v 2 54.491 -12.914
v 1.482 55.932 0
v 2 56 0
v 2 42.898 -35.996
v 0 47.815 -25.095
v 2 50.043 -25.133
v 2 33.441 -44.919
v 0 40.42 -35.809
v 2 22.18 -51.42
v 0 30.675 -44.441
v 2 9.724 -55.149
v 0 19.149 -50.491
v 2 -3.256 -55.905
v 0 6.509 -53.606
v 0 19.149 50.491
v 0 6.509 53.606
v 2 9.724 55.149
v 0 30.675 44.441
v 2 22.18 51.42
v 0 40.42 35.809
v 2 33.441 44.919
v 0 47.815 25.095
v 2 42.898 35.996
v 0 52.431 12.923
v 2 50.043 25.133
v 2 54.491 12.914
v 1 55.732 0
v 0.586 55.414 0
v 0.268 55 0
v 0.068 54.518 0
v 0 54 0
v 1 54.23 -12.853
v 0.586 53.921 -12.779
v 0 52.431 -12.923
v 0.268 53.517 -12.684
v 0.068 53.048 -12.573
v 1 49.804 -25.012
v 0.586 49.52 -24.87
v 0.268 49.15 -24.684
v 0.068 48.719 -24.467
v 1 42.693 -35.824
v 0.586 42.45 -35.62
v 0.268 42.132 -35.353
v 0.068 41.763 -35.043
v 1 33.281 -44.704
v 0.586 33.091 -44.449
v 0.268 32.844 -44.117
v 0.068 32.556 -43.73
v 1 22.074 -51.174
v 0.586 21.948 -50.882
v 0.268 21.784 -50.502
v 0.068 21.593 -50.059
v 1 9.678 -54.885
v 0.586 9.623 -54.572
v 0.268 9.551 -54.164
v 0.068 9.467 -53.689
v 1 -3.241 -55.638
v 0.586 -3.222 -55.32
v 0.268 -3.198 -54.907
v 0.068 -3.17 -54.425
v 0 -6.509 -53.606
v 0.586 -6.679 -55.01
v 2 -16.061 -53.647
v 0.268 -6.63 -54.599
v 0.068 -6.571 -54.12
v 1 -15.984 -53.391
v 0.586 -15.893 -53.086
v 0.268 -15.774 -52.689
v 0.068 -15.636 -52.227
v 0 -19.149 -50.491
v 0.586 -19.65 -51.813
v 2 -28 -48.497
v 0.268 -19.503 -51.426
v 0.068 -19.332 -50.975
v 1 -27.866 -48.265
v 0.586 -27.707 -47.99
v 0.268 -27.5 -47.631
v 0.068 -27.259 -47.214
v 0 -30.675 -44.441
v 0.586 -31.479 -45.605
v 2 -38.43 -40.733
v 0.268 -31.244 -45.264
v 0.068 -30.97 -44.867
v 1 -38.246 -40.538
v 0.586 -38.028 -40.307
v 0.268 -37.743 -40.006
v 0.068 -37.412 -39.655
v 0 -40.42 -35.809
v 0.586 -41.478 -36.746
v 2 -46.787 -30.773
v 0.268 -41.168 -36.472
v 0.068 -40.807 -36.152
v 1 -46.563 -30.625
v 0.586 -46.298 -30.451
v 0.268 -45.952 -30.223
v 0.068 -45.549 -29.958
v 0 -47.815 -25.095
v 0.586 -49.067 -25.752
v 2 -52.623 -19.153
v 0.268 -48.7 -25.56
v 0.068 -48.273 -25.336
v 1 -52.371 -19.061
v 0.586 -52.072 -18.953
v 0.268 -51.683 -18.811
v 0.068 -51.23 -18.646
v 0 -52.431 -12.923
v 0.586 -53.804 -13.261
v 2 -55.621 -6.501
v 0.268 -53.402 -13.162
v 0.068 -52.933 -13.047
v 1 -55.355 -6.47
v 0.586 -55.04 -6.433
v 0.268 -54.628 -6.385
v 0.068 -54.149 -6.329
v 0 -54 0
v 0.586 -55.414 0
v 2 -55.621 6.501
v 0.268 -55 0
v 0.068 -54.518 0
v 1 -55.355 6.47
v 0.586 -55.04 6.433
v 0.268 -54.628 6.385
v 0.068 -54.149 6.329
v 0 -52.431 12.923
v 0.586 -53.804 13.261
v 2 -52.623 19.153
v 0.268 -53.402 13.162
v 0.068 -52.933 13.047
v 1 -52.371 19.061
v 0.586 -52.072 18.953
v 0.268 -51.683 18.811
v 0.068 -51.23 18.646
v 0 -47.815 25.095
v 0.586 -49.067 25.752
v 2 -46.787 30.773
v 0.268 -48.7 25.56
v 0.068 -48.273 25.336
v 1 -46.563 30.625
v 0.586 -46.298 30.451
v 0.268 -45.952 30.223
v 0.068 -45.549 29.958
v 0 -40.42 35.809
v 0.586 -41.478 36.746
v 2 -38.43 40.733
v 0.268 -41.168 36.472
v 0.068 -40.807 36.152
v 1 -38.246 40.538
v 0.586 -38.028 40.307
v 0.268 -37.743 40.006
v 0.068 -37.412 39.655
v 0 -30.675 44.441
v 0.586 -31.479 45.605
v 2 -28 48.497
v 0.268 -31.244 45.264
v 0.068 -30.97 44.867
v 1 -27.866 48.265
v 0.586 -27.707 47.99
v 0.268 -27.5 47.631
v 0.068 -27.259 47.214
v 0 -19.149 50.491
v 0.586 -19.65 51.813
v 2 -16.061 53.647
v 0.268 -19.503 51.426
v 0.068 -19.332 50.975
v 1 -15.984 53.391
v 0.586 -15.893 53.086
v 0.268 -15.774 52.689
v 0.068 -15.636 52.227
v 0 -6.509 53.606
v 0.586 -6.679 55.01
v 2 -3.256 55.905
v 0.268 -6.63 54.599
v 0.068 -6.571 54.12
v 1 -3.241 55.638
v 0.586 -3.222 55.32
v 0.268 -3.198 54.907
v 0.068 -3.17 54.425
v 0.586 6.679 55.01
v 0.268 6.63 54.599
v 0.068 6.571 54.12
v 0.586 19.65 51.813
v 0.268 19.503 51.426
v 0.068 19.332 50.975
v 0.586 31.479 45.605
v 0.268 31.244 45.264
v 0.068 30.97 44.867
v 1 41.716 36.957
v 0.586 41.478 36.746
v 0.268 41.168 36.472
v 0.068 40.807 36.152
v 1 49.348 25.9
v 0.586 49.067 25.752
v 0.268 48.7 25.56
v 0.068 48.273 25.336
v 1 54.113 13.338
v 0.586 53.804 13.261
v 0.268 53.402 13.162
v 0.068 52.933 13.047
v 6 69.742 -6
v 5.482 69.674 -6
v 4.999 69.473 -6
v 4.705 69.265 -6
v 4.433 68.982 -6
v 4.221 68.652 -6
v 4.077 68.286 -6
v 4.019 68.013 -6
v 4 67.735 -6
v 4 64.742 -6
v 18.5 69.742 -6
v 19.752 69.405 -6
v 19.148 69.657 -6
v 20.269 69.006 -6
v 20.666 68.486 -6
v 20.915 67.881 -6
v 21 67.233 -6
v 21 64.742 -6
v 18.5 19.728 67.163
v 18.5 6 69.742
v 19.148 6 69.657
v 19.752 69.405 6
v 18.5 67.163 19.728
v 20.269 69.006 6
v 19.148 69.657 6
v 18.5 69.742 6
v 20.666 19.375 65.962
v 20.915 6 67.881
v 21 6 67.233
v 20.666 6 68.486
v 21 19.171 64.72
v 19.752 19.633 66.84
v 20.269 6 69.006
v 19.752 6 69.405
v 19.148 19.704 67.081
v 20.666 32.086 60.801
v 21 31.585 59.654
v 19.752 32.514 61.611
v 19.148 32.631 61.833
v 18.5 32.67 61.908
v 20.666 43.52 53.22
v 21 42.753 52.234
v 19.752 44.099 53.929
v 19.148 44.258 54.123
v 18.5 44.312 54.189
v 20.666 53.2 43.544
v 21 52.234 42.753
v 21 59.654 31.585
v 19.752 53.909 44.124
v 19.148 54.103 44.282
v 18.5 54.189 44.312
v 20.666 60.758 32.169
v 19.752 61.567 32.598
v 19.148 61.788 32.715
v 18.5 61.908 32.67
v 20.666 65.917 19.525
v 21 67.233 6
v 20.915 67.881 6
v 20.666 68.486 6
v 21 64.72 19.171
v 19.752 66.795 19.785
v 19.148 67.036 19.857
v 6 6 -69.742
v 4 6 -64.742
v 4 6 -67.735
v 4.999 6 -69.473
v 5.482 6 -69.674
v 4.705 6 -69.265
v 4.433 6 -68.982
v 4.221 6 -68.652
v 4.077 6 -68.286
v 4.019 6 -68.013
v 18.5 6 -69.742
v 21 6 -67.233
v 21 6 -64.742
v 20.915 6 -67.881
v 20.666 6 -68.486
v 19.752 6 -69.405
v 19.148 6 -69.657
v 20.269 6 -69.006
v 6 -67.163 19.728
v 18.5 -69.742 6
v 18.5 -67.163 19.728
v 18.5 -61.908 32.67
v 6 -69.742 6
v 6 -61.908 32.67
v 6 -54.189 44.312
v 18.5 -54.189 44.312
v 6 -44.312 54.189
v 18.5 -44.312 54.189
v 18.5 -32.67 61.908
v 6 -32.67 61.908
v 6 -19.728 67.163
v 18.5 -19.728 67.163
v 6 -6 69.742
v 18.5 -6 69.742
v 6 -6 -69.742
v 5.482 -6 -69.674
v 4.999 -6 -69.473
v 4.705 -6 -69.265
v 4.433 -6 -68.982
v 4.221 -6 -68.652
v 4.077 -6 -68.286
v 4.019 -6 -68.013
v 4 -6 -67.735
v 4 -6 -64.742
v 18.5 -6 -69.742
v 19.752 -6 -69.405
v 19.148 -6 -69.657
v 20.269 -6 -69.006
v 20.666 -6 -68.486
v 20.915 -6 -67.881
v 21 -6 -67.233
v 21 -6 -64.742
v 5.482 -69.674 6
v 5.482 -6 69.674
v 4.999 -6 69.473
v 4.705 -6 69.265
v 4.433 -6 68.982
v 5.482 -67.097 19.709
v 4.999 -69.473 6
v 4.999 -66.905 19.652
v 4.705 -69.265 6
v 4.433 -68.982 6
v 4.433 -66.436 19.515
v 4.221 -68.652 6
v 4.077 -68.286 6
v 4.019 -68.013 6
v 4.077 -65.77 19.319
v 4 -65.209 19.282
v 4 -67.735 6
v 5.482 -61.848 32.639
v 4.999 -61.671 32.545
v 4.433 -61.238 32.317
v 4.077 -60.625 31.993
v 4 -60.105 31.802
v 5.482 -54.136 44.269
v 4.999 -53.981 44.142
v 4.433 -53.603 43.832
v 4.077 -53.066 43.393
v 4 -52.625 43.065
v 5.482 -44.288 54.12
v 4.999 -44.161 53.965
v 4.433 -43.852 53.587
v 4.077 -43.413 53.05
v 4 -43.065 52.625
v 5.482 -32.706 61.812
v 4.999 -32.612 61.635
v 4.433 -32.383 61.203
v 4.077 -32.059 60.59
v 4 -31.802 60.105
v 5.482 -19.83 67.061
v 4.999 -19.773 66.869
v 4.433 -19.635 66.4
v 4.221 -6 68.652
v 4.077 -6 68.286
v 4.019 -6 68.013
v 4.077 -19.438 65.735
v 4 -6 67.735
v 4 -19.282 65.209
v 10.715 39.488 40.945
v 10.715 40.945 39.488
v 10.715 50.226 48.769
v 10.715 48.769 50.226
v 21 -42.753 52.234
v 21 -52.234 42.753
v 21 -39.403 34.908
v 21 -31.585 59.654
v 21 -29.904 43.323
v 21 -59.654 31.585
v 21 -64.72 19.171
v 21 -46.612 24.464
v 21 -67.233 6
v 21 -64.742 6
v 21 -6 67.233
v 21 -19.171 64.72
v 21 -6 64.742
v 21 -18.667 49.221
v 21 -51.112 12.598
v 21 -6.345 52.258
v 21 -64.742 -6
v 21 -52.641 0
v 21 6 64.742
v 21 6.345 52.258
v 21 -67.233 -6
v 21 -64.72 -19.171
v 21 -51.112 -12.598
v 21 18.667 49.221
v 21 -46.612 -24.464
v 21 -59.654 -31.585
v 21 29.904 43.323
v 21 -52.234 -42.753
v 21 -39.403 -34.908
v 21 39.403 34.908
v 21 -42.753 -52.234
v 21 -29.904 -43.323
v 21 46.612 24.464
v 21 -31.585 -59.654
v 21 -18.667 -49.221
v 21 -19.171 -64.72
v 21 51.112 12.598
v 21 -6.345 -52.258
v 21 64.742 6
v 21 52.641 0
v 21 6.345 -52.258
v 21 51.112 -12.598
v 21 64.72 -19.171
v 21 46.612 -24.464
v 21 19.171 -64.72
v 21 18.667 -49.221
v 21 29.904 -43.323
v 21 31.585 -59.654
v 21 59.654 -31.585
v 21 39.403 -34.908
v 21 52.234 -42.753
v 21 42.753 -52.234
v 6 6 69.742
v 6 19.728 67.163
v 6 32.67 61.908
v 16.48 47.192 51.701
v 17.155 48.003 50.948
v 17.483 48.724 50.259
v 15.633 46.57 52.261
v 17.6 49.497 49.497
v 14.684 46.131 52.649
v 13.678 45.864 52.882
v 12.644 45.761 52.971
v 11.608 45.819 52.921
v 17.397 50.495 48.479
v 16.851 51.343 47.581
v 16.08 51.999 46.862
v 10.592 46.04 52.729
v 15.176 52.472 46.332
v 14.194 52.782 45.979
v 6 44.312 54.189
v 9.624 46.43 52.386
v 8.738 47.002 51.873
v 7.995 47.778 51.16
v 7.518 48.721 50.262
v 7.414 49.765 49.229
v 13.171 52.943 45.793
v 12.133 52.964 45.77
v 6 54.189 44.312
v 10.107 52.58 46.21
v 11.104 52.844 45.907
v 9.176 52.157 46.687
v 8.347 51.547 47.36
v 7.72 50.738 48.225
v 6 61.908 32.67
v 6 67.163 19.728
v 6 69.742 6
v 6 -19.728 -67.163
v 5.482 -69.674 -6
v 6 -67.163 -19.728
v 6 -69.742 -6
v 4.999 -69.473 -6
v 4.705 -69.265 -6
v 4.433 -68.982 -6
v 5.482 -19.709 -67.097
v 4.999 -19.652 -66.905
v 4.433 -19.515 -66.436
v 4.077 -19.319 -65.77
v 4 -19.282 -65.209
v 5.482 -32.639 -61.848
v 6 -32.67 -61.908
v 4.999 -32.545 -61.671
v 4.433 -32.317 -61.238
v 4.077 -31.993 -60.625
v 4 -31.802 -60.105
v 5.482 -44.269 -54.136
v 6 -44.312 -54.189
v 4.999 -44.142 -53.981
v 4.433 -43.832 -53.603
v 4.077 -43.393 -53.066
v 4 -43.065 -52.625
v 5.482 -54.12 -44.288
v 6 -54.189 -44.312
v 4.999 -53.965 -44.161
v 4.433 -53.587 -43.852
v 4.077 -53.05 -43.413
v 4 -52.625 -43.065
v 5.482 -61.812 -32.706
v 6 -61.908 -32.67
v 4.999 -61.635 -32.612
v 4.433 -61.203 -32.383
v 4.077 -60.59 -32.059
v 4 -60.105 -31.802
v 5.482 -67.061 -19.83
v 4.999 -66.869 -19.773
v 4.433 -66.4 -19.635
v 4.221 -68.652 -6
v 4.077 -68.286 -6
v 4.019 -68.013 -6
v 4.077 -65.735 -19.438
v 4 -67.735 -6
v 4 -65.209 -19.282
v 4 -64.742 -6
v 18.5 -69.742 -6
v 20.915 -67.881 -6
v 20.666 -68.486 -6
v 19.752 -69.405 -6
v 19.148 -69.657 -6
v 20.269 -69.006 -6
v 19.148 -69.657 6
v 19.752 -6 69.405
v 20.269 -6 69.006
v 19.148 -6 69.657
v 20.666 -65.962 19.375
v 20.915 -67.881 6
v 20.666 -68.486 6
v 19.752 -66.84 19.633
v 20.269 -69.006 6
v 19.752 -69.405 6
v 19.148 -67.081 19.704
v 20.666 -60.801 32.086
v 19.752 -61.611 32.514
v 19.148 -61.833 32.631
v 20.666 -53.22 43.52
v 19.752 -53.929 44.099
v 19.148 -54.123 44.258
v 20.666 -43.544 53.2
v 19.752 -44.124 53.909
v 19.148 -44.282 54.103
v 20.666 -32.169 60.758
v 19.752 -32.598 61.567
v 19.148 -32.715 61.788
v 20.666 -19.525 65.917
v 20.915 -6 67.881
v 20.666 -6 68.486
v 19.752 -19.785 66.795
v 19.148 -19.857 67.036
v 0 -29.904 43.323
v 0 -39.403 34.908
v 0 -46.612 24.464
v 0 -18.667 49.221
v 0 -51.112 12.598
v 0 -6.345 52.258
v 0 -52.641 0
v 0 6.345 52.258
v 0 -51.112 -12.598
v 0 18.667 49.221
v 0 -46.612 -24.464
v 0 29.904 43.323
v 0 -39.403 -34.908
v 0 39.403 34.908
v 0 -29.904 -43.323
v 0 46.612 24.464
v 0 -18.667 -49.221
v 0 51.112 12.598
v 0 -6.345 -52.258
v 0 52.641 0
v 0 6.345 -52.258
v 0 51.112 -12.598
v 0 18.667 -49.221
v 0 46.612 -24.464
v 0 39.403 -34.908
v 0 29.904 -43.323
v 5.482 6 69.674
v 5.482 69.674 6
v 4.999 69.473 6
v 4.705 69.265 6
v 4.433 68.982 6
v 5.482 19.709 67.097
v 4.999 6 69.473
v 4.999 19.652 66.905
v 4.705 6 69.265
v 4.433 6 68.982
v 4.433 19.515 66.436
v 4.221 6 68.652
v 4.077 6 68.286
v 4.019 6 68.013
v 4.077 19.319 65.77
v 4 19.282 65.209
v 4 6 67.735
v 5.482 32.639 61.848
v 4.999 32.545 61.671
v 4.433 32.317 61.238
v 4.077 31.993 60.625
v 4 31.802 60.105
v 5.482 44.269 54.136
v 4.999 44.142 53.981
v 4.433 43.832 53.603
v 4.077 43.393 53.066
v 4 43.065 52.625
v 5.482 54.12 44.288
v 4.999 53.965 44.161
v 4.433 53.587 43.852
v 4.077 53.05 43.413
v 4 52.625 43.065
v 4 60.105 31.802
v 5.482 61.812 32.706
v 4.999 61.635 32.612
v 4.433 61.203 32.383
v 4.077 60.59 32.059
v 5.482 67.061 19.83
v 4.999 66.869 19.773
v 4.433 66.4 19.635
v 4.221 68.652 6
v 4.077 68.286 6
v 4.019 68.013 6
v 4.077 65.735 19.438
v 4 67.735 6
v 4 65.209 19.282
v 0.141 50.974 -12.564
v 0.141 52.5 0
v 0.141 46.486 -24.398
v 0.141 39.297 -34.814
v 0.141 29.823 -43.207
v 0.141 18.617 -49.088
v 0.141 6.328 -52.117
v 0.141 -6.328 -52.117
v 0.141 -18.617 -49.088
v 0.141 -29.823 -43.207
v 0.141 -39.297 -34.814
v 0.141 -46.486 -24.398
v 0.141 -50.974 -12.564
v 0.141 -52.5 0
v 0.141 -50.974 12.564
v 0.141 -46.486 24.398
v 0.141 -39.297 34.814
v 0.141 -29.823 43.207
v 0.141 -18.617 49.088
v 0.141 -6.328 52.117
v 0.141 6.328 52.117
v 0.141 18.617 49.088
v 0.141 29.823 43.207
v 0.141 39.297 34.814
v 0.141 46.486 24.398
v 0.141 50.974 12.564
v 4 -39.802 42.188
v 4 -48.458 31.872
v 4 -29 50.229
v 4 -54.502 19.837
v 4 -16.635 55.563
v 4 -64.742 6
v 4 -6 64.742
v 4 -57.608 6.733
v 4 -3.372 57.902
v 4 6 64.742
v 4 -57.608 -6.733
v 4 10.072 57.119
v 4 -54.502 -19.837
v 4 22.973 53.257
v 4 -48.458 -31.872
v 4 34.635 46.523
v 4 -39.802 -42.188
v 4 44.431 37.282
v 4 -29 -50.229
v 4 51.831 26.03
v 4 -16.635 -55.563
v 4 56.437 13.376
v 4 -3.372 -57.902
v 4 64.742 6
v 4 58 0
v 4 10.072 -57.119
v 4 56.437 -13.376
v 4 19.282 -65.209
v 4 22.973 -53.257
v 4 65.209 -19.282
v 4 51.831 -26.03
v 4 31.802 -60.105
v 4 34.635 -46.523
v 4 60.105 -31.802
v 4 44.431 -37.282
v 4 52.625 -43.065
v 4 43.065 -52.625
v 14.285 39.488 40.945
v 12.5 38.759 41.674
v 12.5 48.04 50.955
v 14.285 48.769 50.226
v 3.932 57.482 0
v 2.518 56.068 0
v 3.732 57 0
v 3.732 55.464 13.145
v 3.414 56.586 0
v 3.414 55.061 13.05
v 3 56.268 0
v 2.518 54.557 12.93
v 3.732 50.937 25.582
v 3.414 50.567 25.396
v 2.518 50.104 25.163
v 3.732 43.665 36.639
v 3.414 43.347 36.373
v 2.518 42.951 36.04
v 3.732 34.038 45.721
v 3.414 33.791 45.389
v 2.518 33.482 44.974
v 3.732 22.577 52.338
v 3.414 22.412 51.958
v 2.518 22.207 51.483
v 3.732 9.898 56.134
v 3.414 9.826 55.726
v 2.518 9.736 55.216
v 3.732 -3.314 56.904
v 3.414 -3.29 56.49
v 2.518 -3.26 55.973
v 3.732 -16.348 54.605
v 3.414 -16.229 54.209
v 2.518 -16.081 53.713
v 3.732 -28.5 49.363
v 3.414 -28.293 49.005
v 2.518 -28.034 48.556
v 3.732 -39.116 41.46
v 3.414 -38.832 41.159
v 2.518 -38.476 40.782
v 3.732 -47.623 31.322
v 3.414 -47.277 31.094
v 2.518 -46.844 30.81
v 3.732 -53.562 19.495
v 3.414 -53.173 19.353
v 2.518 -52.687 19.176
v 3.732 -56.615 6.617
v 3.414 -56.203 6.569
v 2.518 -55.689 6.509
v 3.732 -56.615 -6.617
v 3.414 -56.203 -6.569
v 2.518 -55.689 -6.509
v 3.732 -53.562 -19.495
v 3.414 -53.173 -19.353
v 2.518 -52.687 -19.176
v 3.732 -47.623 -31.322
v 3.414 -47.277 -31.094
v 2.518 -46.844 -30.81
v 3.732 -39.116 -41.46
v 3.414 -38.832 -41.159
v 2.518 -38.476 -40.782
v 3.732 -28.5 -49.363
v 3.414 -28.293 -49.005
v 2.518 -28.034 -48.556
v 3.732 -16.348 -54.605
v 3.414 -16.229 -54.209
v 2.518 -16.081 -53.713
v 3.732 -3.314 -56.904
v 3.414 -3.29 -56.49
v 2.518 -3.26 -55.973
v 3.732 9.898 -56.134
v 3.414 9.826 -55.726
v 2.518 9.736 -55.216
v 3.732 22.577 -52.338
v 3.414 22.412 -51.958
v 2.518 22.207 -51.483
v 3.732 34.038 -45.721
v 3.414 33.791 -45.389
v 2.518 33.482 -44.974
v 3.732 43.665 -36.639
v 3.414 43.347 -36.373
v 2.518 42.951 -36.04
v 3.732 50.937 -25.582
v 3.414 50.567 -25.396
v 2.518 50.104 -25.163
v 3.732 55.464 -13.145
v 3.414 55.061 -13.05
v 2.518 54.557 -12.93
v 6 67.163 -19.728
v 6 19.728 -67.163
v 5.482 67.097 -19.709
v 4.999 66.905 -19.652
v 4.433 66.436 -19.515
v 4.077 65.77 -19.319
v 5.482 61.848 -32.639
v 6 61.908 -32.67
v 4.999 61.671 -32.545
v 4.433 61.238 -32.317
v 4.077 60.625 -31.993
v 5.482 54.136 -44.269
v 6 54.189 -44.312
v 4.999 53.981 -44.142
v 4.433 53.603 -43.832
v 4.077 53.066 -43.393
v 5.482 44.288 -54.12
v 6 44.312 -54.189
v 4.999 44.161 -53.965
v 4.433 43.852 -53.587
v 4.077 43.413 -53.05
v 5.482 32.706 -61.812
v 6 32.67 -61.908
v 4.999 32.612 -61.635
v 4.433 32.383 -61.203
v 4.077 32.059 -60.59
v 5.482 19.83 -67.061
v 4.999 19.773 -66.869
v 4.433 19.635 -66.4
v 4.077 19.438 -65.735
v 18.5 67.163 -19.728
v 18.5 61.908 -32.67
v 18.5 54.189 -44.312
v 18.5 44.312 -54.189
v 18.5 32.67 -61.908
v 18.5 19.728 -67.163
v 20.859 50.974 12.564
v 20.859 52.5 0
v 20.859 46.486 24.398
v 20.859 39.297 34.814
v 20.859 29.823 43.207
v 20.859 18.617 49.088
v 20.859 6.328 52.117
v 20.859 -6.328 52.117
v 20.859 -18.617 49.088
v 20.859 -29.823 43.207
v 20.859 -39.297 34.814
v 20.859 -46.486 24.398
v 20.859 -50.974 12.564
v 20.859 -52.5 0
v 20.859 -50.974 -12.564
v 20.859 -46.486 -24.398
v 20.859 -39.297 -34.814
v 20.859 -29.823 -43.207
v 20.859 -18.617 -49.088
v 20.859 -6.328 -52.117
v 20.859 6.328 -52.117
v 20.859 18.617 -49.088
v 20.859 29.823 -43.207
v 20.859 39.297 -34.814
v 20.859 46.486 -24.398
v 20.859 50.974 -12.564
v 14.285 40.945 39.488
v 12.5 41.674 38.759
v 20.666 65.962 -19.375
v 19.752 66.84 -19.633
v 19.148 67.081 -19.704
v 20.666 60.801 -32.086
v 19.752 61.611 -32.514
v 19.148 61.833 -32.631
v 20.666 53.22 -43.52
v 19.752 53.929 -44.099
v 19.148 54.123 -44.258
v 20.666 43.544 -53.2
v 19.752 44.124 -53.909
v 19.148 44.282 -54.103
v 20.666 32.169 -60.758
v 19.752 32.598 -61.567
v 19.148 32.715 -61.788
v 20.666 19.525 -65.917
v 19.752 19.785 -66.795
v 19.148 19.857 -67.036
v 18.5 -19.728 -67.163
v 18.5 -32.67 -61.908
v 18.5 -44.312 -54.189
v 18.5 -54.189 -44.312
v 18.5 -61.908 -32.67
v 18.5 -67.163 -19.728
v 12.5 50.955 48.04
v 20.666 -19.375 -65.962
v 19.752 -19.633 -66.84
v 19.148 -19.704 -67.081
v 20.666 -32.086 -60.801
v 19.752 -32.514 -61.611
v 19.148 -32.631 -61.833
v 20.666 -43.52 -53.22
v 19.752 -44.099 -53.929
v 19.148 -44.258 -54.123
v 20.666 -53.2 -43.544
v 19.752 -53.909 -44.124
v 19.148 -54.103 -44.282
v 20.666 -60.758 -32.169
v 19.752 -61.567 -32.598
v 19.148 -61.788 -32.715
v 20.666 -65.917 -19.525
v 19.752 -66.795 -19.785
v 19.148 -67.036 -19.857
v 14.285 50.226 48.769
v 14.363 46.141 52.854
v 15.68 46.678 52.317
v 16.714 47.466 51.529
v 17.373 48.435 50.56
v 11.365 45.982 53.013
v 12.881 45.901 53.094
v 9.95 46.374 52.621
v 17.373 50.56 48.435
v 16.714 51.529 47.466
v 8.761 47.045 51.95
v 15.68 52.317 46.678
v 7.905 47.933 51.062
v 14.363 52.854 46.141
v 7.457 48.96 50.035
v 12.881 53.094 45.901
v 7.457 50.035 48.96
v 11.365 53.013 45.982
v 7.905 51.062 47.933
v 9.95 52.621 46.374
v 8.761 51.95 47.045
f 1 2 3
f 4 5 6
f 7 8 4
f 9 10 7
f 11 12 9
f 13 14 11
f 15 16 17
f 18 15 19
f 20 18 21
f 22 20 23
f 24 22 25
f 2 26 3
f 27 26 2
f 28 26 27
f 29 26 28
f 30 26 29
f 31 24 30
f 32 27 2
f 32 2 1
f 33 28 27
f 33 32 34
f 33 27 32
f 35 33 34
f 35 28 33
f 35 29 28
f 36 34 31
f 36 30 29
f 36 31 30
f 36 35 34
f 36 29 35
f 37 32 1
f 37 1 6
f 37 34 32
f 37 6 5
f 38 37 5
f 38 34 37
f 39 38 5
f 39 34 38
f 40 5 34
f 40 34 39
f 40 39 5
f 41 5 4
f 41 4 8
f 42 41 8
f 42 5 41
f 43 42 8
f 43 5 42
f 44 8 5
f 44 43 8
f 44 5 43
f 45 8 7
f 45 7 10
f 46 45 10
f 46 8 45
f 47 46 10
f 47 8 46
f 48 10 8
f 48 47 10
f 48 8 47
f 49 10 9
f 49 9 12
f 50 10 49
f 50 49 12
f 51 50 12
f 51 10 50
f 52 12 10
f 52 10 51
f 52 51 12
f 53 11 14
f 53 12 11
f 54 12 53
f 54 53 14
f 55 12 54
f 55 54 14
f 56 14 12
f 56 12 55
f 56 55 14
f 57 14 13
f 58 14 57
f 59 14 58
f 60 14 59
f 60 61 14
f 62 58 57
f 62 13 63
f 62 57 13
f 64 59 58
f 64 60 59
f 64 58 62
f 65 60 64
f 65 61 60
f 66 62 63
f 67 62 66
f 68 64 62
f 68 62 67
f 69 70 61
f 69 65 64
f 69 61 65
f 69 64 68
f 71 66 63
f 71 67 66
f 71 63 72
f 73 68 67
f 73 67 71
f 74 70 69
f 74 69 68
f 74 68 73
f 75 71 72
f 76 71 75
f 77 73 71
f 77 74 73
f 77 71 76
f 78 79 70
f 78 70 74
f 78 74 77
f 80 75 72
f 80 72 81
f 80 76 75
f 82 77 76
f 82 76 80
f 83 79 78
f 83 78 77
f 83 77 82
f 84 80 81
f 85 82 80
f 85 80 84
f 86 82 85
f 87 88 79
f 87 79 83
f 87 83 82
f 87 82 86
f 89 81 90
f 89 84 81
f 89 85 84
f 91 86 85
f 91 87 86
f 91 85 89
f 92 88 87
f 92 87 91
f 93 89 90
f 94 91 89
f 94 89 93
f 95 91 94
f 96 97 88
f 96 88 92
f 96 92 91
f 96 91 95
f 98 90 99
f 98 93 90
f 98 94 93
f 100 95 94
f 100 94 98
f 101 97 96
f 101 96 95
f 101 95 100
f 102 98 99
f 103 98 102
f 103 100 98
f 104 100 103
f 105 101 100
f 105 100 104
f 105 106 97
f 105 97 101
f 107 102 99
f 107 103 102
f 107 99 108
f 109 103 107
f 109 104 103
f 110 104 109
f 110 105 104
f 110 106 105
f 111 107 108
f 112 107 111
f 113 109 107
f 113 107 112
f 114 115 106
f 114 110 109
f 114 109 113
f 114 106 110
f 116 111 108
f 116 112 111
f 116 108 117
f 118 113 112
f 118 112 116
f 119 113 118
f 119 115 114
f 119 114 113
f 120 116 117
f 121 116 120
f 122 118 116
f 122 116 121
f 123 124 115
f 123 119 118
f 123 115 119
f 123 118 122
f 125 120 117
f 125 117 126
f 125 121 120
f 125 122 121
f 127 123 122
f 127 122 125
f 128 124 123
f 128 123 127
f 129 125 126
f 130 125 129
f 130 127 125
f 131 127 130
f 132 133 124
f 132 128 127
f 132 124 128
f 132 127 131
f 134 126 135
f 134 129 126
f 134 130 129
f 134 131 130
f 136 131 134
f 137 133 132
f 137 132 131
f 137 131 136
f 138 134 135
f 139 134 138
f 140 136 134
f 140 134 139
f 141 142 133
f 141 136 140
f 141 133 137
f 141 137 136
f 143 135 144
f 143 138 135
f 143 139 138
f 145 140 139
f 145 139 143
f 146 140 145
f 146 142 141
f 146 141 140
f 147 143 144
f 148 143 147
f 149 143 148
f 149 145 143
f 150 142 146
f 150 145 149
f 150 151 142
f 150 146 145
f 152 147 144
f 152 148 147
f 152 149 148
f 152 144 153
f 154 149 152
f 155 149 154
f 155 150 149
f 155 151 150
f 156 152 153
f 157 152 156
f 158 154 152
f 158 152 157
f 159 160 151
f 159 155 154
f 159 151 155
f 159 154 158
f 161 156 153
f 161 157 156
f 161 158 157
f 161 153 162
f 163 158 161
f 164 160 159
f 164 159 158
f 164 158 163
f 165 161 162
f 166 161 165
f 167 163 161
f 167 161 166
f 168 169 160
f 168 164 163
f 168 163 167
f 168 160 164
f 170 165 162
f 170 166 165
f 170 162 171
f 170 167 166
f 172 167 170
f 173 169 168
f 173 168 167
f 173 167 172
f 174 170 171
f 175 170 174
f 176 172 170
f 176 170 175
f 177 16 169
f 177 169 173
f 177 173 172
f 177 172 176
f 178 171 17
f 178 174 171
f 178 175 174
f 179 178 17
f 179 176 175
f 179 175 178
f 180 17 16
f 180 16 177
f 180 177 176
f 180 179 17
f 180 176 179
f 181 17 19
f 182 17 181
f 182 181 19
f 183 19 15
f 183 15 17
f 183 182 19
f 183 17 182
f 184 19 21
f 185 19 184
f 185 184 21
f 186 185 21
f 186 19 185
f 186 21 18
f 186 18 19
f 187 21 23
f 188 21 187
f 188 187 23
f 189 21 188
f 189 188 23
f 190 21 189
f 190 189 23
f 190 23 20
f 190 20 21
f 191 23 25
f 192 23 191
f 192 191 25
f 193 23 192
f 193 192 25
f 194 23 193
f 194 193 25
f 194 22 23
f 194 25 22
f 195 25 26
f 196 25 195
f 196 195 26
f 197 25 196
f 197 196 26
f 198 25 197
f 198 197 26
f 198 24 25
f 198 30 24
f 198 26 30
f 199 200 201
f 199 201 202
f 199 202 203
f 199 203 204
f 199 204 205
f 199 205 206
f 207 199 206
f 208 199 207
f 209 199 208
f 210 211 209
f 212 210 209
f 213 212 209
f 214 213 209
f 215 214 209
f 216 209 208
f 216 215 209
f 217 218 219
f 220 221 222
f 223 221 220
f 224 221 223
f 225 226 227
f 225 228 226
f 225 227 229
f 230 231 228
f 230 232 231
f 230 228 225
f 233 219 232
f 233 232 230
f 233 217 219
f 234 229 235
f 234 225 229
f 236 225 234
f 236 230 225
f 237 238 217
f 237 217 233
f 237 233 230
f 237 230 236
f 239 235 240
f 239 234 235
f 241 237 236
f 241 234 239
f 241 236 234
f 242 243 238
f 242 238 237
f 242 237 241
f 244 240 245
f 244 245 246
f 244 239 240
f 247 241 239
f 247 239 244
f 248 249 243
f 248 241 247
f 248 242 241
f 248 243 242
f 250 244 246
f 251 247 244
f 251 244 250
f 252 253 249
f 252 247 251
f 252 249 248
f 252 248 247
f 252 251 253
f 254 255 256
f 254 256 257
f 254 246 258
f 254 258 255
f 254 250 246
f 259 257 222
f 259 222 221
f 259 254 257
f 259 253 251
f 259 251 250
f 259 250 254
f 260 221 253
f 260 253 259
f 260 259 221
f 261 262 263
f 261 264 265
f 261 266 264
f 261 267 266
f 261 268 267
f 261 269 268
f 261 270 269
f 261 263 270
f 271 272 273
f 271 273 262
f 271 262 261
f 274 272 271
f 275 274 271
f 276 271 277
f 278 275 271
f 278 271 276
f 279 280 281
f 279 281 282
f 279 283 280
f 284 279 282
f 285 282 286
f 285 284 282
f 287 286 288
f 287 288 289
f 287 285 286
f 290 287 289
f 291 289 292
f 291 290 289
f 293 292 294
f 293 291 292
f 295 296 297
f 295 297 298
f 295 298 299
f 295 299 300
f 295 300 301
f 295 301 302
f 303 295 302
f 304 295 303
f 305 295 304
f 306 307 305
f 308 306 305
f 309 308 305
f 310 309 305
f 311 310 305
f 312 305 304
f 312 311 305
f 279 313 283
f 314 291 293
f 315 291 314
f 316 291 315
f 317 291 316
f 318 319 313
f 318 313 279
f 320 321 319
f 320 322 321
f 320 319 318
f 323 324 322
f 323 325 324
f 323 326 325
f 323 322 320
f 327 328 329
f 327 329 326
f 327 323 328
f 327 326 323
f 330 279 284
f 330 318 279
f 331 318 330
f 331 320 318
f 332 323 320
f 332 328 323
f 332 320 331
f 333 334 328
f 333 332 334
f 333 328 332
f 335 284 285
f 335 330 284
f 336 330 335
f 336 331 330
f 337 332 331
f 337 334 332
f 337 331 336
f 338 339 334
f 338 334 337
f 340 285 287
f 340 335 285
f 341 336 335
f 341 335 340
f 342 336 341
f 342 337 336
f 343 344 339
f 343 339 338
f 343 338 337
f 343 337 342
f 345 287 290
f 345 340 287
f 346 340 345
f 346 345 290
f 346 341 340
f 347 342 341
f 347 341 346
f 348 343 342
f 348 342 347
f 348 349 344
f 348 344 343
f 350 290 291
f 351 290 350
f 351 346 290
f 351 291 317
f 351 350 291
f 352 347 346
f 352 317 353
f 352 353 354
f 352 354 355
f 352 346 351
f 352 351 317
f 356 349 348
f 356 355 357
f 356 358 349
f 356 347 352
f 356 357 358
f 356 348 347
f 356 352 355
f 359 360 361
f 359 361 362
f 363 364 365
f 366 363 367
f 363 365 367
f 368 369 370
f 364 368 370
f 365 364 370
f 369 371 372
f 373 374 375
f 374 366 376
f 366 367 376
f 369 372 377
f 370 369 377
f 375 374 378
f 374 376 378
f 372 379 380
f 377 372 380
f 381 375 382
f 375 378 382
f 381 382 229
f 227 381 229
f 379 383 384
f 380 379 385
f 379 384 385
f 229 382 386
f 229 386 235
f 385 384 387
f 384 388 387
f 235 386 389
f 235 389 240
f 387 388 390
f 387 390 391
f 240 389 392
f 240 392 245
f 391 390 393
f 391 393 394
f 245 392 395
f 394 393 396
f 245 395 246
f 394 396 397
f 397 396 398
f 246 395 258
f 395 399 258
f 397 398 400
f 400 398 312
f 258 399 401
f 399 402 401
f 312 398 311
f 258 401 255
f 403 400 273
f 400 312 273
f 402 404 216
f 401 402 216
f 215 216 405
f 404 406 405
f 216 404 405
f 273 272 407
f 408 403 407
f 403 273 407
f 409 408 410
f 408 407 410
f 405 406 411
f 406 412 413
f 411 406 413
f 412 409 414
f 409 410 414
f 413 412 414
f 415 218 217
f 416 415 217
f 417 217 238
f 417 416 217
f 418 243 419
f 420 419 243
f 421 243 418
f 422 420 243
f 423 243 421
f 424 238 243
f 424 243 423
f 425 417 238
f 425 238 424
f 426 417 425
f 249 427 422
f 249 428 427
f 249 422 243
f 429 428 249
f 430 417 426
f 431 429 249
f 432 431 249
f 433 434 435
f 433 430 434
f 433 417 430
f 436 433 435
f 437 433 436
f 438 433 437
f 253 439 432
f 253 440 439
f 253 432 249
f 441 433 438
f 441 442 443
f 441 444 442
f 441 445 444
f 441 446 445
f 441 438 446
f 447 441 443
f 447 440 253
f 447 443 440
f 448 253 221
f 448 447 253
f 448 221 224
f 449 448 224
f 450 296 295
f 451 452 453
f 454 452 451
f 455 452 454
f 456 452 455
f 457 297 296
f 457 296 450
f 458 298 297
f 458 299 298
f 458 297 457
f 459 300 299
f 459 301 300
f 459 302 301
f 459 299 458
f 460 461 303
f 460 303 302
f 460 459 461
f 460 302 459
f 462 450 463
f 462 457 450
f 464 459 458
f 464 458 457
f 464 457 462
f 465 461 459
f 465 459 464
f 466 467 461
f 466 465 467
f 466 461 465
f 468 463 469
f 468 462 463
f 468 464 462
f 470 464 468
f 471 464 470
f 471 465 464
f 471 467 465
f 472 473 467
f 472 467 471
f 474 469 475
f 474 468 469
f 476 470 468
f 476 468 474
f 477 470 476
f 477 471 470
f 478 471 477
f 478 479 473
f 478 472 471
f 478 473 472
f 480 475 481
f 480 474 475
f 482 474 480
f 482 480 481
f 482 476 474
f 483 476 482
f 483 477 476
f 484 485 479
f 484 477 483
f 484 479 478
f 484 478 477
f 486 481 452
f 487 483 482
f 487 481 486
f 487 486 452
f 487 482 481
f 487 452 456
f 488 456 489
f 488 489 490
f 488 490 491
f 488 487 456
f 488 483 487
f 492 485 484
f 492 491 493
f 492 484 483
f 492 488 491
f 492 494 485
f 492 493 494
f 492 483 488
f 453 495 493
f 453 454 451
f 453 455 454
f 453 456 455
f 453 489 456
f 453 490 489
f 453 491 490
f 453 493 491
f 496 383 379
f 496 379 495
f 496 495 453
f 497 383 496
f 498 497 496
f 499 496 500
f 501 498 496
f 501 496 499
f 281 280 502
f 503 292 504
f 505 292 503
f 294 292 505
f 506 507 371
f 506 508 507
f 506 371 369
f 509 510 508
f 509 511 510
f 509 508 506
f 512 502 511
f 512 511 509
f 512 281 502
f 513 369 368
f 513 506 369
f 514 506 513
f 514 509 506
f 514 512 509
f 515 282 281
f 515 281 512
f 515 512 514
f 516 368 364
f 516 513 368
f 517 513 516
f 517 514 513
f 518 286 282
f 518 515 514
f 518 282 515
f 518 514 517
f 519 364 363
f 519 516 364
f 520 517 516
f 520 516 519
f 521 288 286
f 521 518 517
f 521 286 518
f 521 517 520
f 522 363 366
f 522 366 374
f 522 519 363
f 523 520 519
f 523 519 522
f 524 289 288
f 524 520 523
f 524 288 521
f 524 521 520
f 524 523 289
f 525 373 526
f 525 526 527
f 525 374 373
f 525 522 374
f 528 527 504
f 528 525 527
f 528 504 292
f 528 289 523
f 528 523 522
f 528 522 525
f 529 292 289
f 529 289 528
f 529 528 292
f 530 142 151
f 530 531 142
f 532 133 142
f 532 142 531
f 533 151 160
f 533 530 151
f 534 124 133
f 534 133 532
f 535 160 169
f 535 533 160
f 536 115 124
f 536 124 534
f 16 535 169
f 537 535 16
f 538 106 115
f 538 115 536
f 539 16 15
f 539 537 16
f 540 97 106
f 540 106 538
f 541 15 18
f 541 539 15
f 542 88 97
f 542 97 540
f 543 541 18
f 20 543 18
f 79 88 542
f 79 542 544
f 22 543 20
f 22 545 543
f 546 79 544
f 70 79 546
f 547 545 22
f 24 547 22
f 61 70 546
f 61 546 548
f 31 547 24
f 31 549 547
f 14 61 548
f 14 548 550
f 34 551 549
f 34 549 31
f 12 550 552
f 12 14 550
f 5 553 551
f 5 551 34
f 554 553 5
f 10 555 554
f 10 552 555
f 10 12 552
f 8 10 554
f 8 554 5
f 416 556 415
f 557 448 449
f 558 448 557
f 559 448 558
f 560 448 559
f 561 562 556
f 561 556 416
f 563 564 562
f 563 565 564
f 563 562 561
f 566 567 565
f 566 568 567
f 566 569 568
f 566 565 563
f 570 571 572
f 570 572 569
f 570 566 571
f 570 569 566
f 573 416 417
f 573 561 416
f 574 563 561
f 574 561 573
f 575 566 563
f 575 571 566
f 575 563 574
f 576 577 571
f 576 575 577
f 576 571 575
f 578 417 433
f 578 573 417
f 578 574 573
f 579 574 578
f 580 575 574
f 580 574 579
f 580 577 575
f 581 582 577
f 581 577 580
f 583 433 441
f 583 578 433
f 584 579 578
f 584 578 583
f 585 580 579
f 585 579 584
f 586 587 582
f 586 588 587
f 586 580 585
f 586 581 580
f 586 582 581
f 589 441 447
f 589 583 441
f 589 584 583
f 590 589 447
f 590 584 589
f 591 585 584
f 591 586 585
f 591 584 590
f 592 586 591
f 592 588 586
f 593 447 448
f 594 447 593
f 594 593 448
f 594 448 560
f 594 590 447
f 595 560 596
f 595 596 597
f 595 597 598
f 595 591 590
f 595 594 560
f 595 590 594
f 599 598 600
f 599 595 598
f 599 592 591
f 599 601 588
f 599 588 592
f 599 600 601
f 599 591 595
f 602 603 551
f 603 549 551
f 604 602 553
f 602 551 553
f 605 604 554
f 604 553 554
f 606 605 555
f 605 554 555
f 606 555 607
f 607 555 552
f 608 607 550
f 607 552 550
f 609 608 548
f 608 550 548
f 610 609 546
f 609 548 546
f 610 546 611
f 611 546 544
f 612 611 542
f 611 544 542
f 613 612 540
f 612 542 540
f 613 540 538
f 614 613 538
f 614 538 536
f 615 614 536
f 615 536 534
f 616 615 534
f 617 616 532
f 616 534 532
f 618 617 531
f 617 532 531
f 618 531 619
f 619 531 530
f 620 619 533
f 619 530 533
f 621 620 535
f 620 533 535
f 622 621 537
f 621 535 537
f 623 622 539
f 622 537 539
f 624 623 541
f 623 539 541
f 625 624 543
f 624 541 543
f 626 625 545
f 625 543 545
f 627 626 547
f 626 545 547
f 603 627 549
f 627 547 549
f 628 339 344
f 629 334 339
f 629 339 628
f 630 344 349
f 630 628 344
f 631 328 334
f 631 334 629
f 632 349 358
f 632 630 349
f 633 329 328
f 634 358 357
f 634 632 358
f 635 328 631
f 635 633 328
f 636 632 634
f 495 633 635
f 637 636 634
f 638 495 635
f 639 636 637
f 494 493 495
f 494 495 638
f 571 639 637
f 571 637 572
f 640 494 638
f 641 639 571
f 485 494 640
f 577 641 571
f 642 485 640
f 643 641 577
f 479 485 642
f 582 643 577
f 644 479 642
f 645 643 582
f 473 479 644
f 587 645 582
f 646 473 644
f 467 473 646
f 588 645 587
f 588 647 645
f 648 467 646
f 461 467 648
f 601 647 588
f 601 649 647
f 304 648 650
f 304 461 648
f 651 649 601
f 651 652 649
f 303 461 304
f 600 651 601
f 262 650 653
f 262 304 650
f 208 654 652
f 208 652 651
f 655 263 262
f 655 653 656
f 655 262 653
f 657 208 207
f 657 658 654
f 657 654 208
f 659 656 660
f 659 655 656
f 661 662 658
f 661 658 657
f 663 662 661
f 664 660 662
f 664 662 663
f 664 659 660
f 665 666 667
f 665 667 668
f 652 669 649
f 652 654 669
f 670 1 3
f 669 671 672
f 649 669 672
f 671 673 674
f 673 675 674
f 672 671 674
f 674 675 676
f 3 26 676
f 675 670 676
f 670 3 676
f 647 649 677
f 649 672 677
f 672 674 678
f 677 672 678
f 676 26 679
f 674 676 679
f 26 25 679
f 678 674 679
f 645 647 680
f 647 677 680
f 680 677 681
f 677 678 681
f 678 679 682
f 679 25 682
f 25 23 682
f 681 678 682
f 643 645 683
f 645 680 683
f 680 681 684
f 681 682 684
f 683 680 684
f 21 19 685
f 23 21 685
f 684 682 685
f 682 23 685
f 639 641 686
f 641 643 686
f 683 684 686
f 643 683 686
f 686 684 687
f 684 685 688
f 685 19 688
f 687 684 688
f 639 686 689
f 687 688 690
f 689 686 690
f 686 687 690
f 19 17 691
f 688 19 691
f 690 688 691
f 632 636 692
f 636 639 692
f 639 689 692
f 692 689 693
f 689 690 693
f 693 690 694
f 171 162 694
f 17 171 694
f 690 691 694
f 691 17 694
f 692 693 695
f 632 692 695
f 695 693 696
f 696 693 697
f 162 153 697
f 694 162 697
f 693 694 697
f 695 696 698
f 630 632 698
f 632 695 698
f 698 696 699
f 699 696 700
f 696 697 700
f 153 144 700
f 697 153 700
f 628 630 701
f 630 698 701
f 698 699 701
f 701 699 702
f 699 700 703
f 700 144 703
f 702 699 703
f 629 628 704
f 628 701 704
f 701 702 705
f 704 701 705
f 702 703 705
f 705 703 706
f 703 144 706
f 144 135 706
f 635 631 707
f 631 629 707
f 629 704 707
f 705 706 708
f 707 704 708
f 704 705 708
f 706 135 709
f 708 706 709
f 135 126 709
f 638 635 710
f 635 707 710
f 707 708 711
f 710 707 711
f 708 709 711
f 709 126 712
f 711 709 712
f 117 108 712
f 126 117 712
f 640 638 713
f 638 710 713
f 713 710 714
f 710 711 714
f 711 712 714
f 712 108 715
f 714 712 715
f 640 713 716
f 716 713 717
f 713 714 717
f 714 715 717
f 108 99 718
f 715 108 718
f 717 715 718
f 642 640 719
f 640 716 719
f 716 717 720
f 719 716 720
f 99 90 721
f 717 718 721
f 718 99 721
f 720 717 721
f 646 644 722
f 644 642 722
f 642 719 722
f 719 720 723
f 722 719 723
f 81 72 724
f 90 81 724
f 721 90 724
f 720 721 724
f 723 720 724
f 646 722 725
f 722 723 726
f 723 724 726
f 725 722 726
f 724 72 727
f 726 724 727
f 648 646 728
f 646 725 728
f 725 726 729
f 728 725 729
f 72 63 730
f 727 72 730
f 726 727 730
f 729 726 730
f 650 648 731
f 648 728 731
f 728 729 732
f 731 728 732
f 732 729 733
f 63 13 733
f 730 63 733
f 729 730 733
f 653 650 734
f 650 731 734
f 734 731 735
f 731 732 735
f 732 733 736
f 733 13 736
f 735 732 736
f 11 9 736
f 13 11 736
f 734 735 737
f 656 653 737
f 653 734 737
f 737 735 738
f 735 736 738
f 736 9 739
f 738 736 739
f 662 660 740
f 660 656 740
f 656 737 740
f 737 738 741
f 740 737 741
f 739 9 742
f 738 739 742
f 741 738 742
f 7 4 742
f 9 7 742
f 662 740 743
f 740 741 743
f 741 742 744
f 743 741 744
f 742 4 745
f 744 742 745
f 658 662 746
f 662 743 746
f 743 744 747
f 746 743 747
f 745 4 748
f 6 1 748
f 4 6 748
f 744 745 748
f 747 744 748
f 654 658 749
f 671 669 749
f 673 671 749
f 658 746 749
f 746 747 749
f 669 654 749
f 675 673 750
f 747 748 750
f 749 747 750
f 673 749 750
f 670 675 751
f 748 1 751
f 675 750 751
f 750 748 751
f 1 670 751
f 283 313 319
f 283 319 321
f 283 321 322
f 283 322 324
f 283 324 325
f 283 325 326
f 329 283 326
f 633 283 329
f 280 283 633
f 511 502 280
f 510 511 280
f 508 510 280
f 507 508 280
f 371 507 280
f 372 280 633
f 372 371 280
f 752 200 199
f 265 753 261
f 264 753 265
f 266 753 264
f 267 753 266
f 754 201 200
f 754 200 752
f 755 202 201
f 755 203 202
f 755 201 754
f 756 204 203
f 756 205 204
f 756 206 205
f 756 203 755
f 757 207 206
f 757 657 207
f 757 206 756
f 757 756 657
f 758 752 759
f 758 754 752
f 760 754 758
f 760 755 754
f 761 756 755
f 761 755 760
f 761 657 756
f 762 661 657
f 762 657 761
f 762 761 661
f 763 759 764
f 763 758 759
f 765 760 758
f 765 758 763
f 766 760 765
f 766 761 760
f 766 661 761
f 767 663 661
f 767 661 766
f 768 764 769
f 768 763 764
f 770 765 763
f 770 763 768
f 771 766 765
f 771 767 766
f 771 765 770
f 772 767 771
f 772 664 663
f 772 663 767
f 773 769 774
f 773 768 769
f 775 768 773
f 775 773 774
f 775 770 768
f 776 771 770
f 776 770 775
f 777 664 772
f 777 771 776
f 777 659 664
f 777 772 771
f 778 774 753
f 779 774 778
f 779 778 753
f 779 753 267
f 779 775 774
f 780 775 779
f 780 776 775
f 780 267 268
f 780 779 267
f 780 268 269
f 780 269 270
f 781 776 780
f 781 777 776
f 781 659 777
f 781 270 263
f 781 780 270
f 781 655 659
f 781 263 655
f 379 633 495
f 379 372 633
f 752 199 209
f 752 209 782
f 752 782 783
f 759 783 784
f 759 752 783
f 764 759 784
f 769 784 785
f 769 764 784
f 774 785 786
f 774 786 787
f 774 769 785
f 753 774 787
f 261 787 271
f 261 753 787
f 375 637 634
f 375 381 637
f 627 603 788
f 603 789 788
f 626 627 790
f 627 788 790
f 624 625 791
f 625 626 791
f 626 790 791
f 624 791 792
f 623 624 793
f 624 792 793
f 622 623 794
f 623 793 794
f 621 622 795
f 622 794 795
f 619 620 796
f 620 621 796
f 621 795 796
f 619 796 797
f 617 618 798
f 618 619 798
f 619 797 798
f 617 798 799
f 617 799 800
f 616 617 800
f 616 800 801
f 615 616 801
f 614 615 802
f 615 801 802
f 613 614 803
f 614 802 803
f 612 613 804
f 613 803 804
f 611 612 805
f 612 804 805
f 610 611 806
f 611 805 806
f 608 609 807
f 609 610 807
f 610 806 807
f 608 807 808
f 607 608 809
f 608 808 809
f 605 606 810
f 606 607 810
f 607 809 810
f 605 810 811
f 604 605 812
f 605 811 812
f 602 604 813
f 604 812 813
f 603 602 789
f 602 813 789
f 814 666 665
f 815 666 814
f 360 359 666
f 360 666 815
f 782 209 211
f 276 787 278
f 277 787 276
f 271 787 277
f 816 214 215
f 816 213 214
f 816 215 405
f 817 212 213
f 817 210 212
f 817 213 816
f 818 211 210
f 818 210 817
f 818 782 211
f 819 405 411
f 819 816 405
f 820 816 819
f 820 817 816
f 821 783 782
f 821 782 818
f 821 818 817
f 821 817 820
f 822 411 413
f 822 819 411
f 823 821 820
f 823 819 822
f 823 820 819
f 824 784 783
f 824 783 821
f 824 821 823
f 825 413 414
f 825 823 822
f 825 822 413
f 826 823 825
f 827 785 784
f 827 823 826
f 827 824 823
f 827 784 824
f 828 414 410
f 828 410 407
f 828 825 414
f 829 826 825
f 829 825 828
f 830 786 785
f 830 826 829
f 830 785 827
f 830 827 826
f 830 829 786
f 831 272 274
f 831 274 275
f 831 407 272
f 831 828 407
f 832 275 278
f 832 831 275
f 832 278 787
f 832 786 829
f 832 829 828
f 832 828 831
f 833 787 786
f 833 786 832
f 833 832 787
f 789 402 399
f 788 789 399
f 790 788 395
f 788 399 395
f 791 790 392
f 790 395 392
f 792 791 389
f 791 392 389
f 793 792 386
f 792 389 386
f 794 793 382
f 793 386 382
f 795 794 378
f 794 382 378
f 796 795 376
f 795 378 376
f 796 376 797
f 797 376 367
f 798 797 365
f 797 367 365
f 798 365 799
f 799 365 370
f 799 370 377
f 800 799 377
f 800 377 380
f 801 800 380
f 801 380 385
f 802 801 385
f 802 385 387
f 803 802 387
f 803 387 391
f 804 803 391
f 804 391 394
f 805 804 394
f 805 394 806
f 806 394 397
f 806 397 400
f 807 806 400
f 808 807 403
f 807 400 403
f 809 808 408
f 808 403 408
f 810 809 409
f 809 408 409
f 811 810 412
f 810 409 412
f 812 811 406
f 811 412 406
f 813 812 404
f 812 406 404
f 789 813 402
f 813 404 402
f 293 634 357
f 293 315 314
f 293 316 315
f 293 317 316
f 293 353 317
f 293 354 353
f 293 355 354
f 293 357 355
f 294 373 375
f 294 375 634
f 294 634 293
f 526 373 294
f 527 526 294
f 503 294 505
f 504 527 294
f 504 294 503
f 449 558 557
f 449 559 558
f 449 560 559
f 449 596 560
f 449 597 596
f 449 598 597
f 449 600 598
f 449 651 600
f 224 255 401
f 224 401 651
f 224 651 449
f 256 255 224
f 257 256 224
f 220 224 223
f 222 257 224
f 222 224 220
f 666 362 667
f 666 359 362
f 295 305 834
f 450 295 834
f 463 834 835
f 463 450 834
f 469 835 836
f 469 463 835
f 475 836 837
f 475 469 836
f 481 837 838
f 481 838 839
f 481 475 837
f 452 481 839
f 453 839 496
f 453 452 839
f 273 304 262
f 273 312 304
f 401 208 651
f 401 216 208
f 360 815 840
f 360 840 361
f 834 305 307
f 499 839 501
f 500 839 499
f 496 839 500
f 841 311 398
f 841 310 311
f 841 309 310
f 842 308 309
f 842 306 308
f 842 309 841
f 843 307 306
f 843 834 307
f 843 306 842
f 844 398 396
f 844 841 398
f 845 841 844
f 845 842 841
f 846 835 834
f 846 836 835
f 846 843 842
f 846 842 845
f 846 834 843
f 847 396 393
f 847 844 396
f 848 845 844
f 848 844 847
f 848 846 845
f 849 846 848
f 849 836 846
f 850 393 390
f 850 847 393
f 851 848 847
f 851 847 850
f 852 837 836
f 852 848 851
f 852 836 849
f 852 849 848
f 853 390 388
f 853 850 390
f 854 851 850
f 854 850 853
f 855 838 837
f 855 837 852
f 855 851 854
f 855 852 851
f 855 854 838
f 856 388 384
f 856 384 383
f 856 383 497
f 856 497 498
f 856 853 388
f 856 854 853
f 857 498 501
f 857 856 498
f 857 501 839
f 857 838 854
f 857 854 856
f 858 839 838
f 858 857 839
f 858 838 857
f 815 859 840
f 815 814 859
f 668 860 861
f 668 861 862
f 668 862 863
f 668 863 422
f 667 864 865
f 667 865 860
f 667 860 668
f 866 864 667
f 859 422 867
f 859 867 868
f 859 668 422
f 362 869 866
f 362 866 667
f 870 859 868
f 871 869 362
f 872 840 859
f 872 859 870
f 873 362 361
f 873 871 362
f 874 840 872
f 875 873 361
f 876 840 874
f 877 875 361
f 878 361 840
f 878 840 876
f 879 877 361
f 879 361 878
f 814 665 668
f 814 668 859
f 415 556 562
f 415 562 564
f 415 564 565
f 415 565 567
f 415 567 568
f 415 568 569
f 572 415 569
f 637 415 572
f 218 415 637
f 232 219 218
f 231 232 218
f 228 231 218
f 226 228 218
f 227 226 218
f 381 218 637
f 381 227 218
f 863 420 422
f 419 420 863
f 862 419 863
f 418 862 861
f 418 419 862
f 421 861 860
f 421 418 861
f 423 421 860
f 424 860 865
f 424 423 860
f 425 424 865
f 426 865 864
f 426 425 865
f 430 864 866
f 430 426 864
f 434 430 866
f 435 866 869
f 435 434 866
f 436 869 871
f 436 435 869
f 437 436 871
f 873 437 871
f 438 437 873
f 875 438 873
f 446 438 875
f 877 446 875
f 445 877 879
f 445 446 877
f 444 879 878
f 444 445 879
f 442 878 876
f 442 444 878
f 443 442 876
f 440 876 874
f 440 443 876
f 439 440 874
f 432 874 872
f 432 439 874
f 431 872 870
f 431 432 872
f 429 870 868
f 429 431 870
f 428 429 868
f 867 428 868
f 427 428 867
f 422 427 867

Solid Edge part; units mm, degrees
sketch "Sketch1" plane through (0, 0, 0) normal (0, 0, 1) x (1, 0, 0)
  line L0 (0, 52.6414) -> (0.1414, 52.5)
  line L1 (0.1414, 52.5) -> (20.8586, 52.5)
  line L2 (20.8586, 52.5) -> (21, 52.6414)
  line L3 (21, 52.6414) -> (21, 67.5)
  arc A0 (21, 67.5) -> (18.5, 70) centre (18.5, 67.5) ccw
  line L4 (18.5, 70) -> (6, 70)
  arc A1 (6, 70) -> (4, 68) centre (6, 68) ccw
  line L5 (4, 68) -> (4, 58)
  arc A2 (4, 58) -> (2, 56) centre (2, 58) cw
  arc A3 (2, 56) -> (0, 54) centre (2, 54) ccw
  line L6 (0, 54) -> (0, 52.6414)
revolve "RevolvedProtrusion1" add sketch "Sketch1" angle 360 about axis through (50, 0, 0) along (-1, 0, 0)
sketch "Sketch2" plane through (21, 0, 0) normal (1, 0, 0) x (0, 1, 0)
  circle A0 centre (0, 0) radius 92.75
  line L0 (6, 69.7424) -> (6, 64.7424)
  line L1 (6, 64.7424) -> (-6, 64.7424)
  line L2 (-6, 64.7424) -> (-6, 69.7424)
  arc A1 (-6, 69.7424) -> (-69.7424, 6) centre (0, 0) ccw
  line L3 (-69.7424, 6) -> (-64.7424, 6)
  line L4 (-64.7424, 6) -> (-64.7424, -6)
  line L5 (-64.7424, -6) -> (-69.7424, -6)
  arc A2 (-69.7424, -6) -> (-6, -69.7424) centre (0, 0) ccw
  line L6 (-6, -69.7424) -> (-6, -64.7424)
  line L7 (-6, -64.7424) -> (6, -64.7424)
  line L8 (6, -64.7424) -> (6, -69.7424)
  arc A3 (6, -69.7424) -> (69.7424, -6) centre (0, 0) ccw
  line L9 (69.7424, -6) -> (64.7424, -6)
  line L10 (64.7424, -6) -> (64.7424, 6)
  line L11 (64.7424, 6) -> (69.7424, 6)
  arc A4 (69.7424, 6) -> (6, 69.7424) centre (0, 0) ccw
extrude "ExtrudedCutout_1" cut sketch "Sketch2" against normal blind 21
sketch "Sketch3" plane through (0, 40.2167, 40.2167) normal (0, 0.7071, 0.7071) x (1, 0, 0)
  circle A0 centre (12.5, 0) radius 5.1
extrude "ExtrudedCutout_2" cut sketch "Sketch3" along normal blind 22.75
sketch "Sketch4" plane through (0, 40.2167, 40.2167) normal (0, 0.7071, 0.7071) x (1, 0, 0)
  circle A0 centre (12.5, 0) radius 5.1
  line L0 (10.715, 1.0306) -> (10.715, -1.0306)
  line L1 (10.715, -1.0306) -> (12.5, -2.0611)
  line L2 (12.5, -2.0611) -> (14.285, -1.0306)
  line L3 (14.285, -1.0306) -> (14.285, 1.0306)
  line L4 (14.285, 1.0306) -> (12.5, 2.0611)
  line L5 (12.5, 2.0611) -> (10.715, 1.0306)
extrude "ExtrudedProtrusion_1" add sketch "Sketch4" along normal blind 13.125
